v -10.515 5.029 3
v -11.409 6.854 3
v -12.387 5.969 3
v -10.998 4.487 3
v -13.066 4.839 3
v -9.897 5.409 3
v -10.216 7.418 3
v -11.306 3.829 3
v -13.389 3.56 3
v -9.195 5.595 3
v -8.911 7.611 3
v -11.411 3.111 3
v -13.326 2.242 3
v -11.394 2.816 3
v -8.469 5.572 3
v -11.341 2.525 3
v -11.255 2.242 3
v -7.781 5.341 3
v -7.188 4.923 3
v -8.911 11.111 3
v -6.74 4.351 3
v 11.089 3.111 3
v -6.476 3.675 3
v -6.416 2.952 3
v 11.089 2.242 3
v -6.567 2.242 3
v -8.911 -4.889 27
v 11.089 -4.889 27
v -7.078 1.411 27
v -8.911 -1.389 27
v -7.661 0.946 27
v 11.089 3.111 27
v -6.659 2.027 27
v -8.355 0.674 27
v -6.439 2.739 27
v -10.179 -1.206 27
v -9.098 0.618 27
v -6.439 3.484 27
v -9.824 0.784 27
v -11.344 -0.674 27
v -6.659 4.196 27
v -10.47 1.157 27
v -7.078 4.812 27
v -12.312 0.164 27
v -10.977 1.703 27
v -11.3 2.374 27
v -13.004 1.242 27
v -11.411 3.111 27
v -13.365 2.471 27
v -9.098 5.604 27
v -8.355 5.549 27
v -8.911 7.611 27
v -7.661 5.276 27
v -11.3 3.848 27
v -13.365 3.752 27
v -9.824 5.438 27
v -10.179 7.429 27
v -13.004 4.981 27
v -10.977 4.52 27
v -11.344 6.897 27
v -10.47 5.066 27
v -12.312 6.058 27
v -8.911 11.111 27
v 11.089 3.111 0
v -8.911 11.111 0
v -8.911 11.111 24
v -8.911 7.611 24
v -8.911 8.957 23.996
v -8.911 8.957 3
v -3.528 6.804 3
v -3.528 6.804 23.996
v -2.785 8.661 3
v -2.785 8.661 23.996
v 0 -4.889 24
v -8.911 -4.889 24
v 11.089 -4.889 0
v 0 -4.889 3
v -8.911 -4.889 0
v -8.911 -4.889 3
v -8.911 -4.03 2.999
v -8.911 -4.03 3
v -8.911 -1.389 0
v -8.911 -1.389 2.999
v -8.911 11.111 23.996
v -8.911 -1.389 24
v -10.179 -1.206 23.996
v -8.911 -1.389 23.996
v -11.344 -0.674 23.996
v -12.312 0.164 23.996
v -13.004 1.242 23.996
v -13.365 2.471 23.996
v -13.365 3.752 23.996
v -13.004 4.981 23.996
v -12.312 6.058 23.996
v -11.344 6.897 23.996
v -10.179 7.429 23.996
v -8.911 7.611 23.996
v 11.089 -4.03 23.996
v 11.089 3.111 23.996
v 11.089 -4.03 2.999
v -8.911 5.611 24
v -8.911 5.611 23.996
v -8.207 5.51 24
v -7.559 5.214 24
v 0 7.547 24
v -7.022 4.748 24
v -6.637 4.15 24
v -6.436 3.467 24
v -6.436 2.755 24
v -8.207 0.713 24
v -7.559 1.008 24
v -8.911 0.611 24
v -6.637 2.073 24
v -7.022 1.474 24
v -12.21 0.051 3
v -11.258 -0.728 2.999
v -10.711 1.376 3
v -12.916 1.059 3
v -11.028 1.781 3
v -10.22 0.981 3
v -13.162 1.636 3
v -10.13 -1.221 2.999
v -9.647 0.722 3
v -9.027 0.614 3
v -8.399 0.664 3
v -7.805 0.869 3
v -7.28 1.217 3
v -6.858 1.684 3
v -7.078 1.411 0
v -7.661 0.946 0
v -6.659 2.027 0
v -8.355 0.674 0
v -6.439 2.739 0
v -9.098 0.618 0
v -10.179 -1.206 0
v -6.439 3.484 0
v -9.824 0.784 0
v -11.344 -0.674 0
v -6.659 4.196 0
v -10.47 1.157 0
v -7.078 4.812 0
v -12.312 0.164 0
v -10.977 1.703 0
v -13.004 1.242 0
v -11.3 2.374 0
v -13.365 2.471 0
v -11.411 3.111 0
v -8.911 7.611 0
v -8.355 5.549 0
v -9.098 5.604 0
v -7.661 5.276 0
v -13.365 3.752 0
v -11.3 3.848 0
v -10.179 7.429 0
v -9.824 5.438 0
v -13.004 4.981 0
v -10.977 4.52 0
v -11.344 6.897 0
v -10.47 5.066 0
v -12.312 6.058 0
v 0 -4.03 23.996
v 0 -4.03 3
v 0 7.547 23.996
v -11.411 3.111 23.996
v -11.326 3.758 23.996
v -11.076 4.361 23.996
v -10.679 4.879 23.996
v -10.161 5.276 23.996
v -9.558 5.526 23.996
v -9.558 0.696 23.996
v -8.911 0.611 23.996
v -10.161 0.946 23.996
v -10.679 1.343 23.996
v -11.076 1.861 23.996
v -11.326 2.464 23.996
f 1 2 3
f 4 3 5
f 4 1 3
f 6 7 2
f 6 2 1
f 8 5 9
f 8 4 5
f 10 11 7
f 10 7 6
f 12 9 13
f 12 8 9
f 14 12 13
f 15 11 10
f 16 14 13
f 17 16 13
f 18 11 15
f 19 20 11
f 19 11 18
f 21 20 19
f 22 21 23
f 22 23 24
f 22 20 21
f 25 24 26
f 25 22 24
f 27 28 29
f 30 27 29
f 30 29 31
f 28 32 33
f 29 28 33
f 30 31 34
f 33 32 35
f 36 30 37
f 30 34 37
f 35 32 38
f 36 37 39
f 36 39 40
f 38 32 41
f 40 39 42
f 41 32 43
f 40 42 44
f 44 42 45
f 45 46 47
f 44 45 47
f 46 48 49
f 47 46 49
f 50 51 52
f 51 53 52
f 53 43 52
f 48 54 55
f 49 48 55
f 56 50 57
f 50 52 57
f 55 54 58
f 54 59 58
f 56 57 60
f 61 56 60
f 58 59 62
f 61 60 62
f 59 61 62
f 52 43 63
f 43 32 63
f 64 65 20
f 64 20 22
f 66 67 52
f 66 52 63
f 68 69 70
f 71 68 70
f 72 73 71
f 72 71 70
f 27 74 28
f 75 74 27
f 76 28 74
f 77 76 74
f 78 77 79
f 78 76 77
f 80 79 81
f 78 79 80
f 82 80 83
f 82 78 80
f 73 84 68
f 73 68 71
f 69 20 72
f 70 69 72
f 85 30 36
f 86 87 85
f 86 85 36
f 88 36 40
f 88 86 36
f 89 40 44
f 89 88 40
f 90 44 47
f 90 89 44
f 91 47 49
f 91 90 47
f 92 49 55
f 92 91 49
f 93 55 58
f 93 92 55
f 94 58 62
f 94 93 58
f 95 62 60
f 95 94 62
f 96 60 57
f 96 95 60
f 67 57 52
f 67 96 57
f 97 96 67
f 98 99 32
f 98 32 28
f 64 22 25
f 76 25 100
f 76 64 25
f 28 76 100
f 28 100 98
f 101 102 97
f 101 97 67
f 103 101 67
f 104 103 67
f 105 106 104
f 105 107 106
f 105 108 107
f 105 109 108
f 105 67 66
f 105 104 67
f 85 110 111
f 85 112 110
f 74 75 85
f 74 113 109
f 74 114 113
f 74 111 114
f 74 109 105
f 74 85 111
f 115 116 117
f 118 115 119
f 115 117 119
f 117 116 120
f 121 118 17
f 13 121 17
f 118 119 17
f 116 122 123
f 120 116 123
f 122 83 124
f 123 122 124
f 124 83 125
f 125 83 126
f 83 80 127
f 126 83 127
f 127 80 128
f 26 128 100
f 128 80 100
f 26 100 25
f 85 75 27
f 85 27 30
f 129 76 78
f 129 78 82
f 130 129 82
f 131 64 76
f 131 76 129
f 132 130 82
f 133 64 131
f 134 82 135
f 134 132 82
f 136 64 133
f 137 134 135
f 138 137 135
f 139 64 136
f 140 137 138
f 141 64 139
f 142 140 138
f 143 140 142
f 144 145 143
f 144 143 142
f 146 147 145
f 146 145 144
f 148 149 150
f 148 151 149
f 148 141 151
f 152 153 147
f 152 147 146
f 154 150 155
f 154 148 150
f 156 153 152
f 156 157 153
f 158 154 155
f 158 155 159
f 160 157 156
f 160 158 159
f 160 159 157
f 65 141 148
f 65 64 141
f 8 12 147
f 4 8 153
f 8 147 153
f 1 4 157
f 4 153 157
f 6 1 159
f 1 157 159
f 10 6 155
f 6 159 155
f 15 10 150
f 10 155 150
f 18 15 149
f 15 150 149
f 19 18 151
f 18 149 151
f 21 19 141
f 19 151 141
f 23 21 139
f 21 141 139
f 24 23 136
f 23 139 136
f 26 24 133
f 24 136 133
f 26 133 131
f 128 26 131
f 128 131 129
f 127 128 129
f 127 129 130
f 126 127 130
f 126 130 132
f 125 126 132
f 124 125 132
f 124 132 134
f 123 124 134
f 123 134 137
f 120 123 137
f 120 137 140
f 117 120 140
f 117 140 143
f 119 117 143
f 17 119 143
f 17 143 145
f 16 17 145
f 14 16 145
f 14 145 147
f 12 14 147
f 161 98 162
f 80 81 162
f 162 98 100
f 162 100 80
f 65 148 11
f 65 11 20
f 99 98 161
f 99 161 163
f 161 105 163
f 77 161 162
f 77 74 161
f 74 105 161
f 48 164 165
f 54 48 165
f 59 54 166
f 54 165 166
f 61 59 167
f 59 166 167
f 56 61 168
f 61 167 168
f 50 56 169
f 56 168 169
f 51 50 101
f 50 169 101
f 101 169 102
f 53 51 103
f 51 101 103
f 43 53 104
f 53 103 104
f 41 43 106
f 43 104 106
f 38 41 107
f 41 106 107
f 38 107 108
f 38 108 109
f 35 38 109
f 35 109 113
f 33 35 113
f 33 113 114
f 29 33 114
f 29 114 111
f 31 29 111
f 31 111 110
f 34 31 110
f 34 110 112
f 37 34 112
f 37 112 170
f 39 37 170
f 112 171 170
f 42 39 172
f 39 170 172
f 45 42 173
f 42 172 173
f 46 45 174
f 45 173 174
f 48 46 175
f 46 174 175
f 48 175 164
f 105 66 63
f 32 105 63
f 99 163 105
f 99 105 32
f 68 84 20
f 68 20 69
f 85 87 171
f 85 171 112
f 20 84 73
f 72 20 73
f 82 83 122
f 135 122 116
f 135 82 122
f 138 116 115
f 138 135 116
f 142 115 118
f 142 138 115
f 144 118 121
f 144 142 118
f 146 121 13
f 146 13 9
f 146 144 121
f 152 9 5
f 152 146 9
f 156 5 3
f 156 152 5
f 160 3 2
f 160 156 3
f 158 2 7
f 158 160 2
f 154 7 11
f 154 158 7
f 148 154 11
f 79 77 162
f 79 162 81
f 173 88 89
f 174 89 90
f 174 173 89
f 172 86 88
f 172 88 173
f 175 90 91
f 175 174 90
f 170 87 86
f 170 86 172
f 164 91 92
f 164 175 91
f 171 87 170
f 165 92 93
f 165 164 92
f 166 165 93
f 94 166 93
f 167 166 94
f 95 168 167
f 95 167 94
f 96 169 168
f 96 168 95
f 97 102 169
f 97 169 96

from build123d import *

# Parameters (mm, degrees)
EXTRUDE_2_DEPTH      = 27
CUT_EXTRUDE_1_DEPTH  = 30
CUT_EXTRUDE_3_DEPTH  = 30
SKETCH_8_W           = 8.910998672
SKETCH_8_H           = 15
CUT_EXTRUDE_4_DEPTH  = 30
SKETCH_38_W          = 5.996496197
SKETCH_38_H          = 7.141479878
CUT_EXTRUDE_5_DEPTH  = 40
SKETCH_41_W          = 6
SKETCH_41_H          = 16.93537555
CUT_EXTRUDE_6_DEPTH  = 40
SKETCH_43_W          = 8.910998672
SKETCH_43_H          = 6
CUT_EXTRUDE_7_DEPTH  = 40
SKETCH_36_R          = 2.5
CUT_EXTRUDE_8_DEPTH  = 40
SKETCH_45_W          = 9.597439288
SKETCH_45_H          = 20.996496197
EXTRUDE_8_DEPTH      = 2
CUT_EXTRUDE_10_DEPTH = 25
SKETCH_49_W          = 3
SKETCH_49_H          = 20.996496197
CUT_EXTRUDE_11_DEPTH = 10


with BuildPart() as part:
    # 草图1 → 凸台-拉伸2 (new body)
    with BuildSketch(Plane.XY):
        with BuildLine():
            Line((-8.910998672, 11.111238711), (11.089001328, 3.111238711))
            Line((11.089001328, 3.111238711), (11.089001328, -4.888761289))
            Line((11.089001328, -4.888761289), (-8.910998672, -4.888761289))
            Line((-8.910998672, -4.888761289), (-8.910998672, -3.888761289))
            Line((-8.910998672, -3.888761289), (-8.910998672, -1.388761289))
            ThreePointArc((-8.910998672, -1.388761289), (-13.410998672, 3.111238711), (-8.910998672, 7.611238711))
            Line((-8.910998672, 7.611238711), (-8.910998672, 10.111238711))
            Line((-8.910998672, 10.111238711), (-8.910998672, 11.111238711))
        make_face()
    extrude(amount=EXTRUDE_2_DEPTH)

    # 草图19 → 切除-拉伸-薄壁1 (cut)
    with BuildSketch(Plane(origin=(11.089001328, 0, 0), x_dir=(0, 0, -1), z_dir=(1, 0, 0))):
        Polygon((-18, -4.030241167), (-18, 12.241944183), (-3, 12.241944183), (-3, 2.241944183), (-8, 2.241944183), (-8, -4.030241167), align=None)
    extrude(amount=-CUT_EXTRUDE_1_DEPTH, mode=Mode.SUBTRACT)

    # 草图27 → 切除-拉伸3 (cut)
    with BuildSketch(Plane(origin=(11.089001328, 0, 0), x_dir=(0, 0, -1), z_dir=(1, 0, 0))):
        Polygon((-8, -4.030241167), (-2.998694363, -4.030241167), (-3, 2.241944183), (-8, 2.241944183), align=None)
    extrude(amount=-CUT_EXTRUDE_3_DEPTH, mode=Mode.SUBTRACT)

    # 草图8 → 切除-拉伸4 (cut)
    with BuildSketch(Plane(origin=(0, -4.888761289, 0), x_dir=(-1, 0, 0), z_dir=(0, -1, 0))):
        with Locations((4.455499336, -10.5)):
            Rectangle(SKETCH_8_W, SKETCH_8_H)
    extrude(amount=-CUT_EXTRUDE_4_DEPTH, mode=Mode.SUBTRACT)

    # 草图38 → 切除-拉伸5 (cut)
    with BuildSketch(Plane(origin=(11.089001328, 0, 0), x_dir=(0, 0, -1), z_dir=(1, 0, 0))):
        with Locations((-20.998248098, -0.459501228)):
            Rectangle(SKETCH_38_W, SKETCH_38_H)
    extrude(amount=-CUT_EXTRUDE_5_DEPTH, mode=Mode.SUBTRACT)

    # 草图41 → 切除-拉伸6 (cut)
    with BuildSketch(Plane(origin=(21.089001328, 0, 0), x_dir=(0, 0, -1), z_dir=(1, 0, 0))):
        with Locations((-20.996496197, 4.437446608)):
            Rectangle(SKETCH_41_W, SKETCH_41_H)
    extrude(amount=-CUT_EXTRUDE_6_DEPTH, mode=Mode.SUBTRACT)

    # 草图43 → 切除-拉伸7 (cut)
    with BuildSketch(Plane.XZ.offset(4.888761289)):
        with Locations((-4.455499336, 21)):
            Rectangle(SKETCH_43_W, SKETCH_43_H)
    extrude(amount=-CUT_EXTRUDE_7_DEPTH, mode=Mode.SUBTRACT)

    # 草图36 → 切除-拉伸8 (cut)
    with BuildSketch(Plane(origin=(0, 0, 0), x_dir=(-1, 0, 0), z_dir=(0, 0, -1))):
        with Locations((8.910998672, 3.111238711)):
            Circle(SKETCH_36_R)
    extrude(amount=-CUT_EXTRUDE_8_DEPTH, mode=Mode.SUBTRACT)


with BuildPart() as body_2:
    # 草图45 → 凸台-拉伸8 (new body)
    with BuildSketch(Plane(origin=(2.602358359, 6.505895899, 0), x_dir=(0.928476691, -0.371390676, 0), z_dir=(0.371390676, 0.928476691, 0))):
        with Locations((-7.601545375, -13.498248099)):
            Rectangle(SKETCH_45_W, SKETCH_45_H)
    extrude(amount=-EXTRUDE_8_DEPTH)

    # 草图47 → 切除-拉伸10 (cut)
    with BuildSketch(Plane(origin=(0, 0, 3), x_dir=(-1, 0, 0), z_dir=(0, 0, -1))):
        Polygon((8.910998672, 11.111238711), (8.910998672, 8.957172788), (9.653780025, 9.254285329), align=None)
    extrude(amount=-CUT_EXTRUDE_10_DEPTH, mode=Mode.SUBTRACT)

    # 草图49 → 切除-拉伸11 (cut)
    with BuildSketch(Plane(origin=(2.602358359, 6.505895899, 0), x_dir=(0.928476691, -0.371390676, 0), z_dir=(0.371390676, 0.928476691, 0))):
        with Locations((-4.302825731, -13.498248099)):
            Rectangle(SKETCH_49_W, SKETCH_49_H)
    extrude(amount=-CUT_EXTRUDE_11_DEPTH, mode=Mode.SUBTRACT)


solid = Compound([part.part, body_2.part])
